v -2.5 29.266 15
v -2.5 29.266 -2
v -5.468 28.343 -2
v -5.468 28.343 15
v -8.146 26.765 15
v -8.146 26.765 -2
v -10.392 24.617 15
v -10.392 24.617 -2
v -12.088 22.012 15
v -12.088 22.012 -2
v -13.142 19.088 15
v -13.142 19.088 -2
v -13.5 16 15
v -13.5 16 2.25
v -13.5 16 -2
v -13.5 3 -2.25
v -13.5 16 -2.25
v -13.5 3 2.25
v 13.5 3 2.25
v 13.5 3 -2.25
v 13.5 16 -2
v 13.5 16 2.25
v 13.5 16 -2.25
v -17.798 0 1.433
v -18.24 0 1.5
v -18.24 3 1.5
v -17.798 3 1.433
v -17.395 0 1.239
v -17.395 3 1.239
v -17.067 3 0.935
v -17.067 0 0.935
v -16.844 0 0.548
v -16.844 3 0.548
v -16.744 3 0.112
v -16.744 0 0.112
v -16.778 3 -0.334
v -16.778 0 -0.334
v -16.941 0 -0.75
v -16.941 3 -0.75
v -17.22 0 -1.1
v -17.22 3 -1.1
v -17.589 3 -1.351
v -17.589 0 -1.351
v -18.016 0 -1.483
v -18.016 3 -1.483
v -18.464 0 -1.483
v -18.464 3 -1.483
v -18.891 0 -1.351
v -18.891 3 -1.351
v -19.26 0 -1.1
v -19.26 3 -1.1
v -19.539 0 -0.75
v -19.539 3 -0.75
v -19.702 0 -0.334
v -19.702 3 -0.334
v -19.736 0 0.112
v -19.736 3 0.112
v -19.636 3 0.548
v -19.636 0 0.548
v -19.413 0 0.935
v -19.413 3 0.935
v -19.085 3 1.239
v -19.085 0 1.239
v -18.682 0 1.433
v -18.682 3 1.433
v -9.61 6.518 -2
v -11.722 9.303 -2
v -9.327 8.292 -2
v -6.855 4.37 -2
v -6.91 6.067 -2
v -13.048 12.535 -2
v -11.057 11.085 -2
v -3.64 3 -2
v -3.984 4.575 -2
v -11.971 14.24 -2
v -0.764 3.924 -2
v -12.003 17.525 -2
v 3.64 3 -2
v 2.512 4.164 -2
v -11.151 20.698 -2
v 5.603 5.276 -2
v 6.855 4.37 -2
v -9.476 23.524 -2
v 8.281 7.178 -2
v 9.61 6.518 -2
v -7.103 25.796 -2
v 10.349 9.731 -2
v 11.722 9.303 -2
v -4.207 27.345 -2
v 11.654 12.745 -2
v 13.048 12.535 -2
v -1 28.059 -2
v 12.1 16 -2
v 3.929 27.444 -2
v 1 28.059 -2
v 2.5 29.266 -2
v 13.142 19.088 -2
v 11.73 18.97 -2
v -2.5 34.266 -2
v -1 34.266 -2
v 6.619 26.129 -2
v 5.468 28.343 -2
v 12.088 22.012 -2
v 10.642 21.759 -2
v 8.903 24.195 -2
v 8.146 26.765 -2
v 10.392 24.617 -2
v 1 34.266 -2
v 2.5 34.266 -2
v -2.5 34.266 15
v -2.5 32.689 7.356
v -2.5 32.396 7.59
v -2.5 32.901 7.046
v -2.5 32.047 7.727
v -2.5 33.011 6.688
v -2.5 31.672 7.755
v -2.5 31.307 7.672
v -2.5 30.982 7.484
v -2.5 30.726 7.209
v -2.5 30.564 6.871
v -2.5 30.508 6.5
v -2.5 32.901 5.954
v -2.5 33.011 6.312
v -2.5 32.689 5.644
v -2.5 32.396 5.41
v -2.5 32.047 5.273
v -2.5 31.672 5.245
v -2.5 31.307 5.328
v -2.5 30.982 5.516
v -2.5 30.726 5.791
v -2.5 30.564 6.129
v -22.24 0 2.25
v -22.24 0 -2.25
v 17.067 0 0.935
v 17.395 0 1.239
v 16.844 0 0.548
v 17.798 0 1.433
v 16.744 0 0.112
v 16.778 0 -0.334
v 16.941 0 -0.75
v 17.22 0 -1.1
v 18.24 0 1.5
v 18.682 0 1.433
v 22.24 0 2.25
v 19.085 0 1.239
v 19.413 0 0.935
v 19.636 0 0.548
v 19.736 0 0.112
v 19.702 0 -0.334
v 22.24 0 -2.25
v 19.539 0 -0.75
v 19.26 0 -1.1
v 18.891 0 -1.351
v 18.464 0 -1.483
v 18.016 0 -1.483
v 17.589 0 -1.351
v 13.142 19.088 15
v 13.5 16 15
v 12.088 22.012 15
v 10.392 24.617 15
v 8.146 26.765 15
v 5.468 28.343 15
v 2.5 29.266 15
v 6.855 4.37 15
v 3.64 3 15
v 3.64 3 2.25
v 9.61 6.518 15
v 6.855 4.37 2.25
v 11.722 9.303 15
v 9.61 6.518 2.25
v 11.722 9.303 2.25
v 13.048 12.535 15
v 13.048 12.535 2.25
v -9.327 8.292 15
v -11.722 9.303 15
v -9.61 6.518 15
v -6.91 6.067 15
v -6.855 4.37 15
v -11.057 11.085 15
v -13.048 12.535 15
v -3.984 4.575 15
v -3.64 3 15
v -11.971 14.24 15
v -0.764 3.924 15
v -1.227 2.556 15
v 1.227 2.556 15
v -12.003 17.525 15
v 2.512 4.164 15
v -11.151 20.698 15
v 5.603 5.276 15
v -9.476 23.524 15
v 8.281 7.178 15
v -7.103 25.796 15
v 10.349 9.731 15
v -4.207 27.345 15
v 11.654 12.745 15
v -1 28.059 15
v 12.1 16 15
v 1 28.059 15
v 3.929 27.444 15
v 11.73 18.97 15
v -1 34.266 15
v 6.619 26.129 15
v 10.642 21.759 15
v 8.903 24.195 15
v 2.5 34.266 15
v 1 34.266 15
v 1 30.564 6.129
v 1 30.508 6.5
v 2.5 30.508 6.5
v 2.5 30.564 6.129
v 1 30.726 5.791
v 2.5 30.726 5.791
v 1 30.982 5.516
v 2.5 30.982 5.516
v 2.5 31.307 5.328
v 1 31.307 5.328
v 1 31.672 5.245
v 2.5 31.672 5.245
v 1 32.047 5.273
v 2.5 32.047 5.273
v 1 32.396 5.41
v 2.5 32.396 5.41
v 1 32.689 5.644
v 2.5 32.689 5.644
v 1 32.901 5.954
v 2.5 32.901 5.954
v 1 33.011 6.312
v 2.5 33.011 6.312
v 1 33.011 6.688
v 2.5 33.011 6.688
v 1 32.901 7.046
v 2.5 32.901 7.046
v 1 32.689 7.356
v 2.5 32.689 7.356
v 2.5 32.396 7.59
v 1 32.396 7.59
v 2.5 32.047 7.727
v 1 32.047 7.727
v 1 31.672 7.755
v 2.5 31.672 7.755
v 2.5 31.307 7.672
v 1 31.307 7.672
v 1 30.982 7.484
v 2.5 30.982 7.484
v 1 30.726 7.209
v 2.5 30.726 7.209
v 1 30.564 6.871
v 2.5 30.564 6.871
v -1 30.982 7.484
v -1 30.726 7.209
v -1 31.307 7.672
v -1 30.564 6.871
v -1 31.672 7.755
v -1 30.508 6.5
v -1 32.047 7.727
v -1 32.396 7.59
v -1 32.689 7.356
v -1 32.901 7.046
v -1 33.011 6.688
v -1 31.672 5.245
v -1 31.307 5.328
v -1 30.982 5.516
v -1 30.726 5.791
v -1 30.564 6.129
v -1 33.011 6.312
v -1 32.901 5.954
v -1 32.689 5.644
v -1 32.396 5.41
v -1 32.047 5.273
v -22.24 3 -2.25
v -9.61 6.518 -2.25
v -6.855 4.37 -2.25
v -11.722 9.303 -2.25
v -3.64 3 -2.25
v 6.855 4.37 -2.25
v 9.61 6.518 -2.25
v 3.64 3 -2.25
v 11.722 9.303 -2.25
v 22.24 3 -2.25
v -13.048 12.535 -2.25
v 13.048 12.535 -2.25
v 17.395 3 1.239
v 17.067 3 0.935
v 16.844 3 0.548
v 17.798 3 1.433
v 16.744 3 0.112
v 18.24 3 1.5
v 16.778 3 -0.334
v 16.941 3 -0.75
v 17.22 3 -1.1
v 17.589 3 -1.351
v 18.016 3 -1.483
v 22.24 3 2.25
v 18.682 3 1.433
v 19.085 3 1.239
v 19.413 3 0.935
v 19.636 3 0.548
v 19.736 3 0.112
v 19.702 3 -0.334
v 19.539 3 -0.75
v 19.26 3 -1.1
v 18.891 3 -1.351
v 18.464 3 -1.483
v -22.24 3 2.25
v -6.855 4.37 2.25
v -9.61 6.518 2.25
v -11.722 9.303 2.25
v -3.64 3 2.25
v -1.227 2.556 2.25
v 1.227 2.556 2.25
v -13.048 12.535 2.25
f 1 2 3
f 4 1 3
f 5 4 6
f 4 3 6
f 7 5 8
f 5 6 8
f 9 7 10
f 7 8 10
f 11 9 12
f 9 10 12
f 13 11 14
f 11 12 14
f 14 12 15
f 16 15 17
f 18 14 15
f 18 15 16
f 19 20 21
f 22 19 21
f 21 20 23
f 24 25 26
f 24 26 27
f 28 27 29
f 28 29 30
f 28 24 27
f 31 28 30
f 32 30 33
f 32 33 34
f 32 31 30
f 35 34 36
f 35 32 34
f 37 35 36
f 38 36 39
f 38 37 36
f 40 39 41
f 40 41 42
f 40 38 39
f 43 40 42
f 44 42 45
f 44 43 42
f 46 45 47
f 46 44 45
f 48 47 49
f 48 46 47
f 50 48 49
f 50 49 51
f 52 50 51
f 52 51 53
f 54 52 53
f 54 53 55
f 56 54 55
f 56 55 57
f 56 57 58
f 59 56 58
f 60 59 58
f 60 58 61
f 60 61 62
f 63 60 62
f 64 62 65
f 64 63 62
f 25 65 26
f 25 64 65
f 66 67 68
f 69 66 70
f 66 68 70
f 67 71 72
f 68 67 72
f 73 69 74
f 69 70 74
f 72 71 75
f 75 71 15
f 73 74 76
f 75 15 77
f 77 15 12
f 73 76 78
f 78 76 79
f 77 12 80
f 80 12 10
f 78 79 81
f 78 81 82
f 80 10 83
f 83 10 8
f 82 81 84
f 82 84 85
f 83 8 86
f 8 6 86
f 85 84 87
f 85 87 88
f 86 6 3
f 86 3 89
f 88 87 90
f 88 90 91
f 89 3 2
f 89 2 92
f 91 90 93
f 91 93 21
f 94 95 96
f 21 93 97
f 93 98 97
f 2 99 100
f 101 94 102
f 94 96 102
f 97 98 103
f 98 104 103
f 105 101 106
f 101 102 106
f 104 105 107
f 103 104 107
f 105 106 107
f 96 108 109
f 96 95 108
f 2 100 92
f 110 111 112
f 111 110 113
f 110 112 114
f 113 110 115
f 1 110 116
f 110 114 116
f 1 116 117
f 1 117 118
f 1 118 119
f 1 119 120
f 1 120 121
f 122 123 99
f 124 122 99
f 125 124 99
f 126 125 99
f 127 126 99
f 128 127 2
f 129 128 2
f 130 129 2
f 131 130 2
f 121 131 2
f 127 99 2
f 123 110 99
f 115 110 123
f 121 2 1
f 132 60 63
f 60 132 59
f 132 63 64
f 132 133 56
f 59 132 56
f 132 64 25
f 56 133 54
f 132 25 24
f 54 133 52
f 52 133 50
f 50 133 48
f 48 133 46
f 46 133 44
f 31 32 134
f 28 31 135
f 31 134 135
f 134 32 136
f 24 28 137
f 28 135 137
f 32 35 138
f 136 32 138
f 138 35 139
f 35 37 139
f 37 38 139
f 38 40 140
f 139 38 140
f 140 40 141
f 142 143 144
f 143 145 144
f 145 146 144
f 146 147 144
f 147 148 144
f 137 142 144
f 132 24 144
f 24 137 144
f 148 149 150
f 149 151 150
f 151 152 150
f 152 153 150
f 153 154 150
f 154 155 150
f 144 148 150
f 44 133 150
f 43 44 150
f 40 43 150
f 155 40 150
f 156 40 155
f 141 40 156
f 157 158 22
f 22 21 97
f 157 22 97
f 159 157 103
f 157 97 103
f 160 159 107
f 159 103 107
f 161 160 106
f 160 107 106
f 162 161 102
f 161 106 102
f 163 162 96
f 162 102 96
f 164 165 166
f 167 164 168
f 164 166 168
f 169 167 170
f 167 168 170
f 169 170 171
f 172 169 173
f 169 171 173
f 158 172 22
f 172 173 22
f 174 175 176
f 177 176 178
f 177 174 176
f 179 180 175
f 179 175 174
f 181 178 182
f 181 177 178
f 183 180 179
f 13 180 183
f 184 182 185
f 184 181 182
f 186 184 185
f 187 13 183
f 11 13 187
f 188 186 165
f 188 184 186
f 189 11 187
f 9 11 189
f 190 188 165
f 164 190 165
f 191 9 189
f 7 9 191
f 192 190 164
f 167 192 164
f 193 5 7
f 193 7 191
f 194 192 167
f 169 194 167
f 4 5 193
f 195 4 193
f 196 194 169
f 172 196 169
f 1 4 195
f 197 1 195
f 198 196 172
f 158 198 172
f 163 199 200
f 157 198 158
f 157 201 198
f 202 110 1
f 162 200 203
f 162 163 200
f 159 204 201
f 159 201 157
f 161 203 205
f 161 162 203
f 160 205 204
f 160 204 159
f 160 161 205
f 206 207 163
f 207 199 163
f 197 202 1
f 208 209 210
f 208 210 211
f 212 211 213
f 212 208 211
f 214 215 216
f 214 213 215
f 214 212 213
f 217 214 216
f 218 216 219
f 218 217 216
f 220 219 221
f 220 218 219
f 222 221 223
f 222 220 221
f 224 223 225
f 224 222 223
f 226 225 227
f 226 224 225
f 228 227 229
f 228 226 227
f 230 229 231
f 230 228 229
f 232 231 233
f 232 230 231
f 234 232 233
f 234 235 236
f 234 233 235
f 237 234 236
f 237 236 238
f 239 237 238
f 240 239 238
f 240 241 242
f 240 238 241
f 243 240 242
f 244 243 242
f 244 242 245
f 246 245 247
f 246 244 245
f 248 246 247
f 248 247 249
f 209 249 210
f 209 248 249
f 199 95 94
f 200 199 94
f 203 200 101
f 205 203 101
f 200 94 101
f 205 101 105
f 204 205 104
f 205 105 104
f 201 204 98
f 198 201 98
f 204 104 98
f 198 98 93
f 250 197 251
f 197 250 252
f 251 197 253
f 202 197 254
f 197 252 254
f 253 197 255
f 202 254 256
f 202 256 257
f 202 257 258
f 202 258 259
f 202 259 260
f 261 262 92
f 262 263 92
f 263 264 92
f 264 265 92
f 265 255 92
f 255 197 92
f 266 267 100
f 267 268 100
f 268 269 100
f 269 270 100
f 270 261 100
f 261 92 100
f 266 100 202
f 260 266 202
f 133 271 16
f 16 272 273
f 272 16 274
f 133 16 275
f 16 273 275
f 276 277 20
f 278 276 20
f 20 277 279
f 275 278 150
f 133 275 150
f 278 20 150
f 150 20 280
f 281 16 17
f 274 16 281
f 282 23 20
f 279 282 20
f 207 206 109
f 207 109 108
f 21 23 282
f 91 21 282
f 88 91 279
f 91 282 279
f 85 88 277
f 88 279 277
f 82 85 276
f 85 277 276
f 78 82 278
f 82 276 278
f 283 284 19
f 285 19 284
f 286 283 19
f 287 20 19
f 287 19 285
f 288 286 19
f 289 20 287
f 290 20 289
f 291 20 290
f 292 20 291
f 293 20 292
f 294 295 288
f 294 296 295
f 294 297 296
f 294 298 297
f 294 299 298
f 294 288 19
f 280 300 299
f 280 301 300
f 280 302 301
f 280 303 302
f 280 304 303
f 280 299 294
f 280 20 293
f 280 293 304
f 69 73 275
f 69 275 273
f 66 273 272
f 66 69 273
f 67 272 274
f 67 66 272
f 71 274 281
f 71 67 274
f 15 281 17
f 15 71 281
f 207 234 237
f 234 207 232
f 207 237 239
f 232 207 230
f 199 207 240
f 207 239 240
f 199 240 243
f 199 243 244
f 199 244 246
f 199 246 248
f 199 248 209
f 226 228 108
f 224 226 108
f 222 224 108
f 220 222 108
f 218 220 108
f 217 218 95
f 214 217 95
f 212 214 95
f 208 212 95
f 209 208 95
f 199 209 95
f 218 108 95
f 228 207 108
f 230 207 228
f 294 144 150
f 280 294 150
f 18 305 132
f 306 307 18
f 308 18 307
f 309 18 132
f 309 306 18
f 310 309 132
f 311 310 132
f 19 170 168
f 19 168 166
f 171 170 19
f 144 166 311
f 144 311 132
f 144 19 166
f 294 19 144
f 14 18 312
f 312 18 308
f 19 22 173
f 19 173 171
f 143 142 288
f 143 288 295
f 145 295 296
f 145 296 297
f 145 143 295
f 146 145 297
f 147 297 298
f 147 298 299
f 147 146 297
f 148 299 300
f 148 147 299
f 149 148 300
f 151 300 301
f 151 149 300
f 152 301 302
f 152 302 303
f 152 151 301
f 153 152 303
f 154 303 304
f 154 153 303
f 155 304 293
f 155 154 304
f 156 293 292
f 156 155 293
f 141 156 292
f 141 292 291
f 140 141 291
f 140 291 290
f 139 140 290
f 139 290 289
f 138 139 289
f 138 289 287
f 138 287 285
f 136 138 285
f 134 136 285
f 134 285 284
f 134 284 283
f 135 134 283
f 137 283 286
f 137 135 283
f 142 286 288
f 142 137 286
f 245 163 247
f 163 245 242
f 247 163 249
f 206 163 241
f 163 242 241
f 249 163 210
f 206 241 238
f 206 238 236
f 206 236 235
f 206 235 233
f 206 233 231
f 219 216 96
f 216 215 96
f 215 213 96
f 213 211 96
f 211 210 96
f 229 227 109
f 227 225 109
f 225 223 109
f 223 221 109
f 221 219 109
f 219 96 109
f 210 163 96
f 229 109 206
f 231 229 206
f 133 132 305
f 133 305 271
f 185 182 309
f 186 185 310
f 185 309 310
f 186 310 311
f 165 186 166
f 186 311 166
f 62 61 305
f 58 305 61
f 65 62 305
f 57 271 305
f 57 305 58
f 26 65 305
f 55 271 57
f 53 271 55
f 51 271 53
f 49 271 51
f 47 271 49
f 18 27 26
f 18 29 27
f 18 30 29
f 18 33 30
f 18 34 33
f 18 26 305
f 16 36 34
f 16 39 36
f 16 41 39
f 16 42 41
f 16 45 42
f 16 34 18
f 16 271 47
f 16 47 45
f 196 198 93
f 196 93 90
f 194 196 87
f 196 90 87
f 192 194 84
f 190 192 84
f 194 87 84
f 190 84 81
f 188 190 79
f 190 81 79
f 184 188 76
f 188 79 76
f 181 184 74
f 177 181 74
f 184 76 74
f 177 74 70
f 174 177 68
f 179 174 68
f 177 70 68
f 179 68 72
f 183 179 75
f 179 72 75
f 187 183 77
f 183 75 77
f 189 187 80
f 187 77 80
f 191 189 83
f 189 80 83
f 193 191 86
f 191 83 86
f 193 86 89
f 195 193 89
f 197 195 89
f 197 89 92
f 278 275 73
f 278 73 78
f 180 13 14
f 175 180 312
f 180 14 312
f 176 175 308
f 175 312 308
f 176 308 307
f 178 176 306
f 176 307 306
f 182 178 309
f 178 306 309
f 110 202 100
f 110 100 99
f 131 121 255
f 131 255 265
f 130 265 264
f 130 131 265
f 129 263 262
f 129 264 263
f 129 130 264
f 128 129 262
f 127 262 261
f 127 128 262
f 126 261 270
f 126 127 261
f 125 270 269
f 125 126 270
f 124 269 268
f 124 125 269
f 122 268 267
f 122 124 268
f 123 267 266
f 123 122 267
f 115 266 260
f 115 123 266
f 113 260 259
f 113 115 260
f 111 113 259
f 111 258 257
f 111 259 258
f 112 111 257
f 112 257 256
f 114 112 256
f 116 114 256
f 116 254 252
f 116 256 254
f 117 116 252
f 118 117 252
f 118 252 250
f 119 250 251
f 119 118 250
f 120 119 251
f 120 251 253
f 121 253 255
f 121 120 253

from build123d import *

# Parameters (mm, degrees)
SKETCH1_W                = 44.48
SKETCH1_H                = 4.5
SKETCH1_R                = 1.5
BOSS_EXTRUDE1_DEPTH      = 3
BOSS_EXTRUDE2_DEPTH      = 15
BOSS_EXTRUDE2_DEPTH_BACK = 2
BOSS_EXTRUDE3_DEPTH      = 2.25
CUT_EXTRUDE1_DEPTH       = 44.517933829
CUT_EXTRUDE1_DEPTH_BACK  = 44.517933829
SKETCH3_R                = 1.258736144


with BuildPart() as part:
    # Sketch1 → Boss-Extrude1 (new body)
    with BuildSketch(Plane(origin=(0, 0, 0), x_dir=(1, 0, 0), z_dir=(0, 1, 0))):
        Rectangle(SKETCH1_W, SKETCH1_H)
        with Locations((-18.24, 0)):
            Circle(SKETCH1_R, mode=Mode.SUBTRACT)
        with Locations((18.24, 0)):
            Circle(SKETCH1_R, mode=Mode.SUBTRACT)
    extrude(amount=BOSS_EXTRUDE1_DEPTH)

    # Sketch2 → Boss-Extrude2 (add, two sides: drawn at the far end of the back side and taken through both)
    with BuildSketch(Plane.XY.offset(-BOSS_EXTRUDE2_DEPTH_BACK)):
        with BuildLine():
            ThreePointArc((-2.5, 29.266499161), (0, 2.5), (2.5, 29.266499161))
            Line((2.5, 29.266499161), (2.5, 34.266499161))
            Line((2.5, 34.266499161), (1, 34.266499161))
            Line((1, 34.266499161), (1, 28.058606885))
            ThreePointArc((1, 28.058606885), (0, 3.9), (-1, 28.058606885))
            Line((-1, 28.058606885), (-1, 34.266499161))
            Line((-1, 34.266499161), (-2.5, 34.266499161))
            Line((-2.5, 34.266499161), (-2.5, 29.266499161))
        make_face()
    extrude(amount=BOSS_EXTRUDE2_DEPTH + BOSS_EXTRUDE2_DEPTH_BACK)

    # Sketch2<3> → Boss-Extrude3 (add, symmetric)
    with BuildSketch(Plane.XY):
        with BuildLine():
            ThreePointArc((-3.640054945, 3), (-10.756178265, 7.841897946), (-13.5, 16))
            Line((-13.5, 16), (-13.5, 3))
            Line((-13.5, 3), (-3.640054945, 3))
        make_face()
        with BuildLine():
            ThreePointArc((13.5, 16), (10.756178265, 7.841897946), (3.640054945, 3))
            Line((3.640054945, 3), (13.5, 3))
            Line((13.5, 3), (13.5, 16))
        make_face()
    extrude(amount=BOSS_EXTRUDE3_DEPTH, both=True)

    # Sketch3 → Cut-Extrude1 (cut, two sides: drawn at the far end of the back side and taken through both)
    with BuildSketch(Plane(origin=(0, 0, 0), x_dir=(0, 0, -1), z_dir=(1, 0, 0)).offset(-CUT_EXTRUDE1_DEPTH_BACK)):
        with Locations((-6.5, 31.766499161)):
            Circle(SKETCH3_R)
    extrude(amount=CUT_EXTRUDE1_DEPTH + CUT_EXTRUDE1_DEPTH_BACK, mode=Mode.SUBTRACT)


solid = part.part
